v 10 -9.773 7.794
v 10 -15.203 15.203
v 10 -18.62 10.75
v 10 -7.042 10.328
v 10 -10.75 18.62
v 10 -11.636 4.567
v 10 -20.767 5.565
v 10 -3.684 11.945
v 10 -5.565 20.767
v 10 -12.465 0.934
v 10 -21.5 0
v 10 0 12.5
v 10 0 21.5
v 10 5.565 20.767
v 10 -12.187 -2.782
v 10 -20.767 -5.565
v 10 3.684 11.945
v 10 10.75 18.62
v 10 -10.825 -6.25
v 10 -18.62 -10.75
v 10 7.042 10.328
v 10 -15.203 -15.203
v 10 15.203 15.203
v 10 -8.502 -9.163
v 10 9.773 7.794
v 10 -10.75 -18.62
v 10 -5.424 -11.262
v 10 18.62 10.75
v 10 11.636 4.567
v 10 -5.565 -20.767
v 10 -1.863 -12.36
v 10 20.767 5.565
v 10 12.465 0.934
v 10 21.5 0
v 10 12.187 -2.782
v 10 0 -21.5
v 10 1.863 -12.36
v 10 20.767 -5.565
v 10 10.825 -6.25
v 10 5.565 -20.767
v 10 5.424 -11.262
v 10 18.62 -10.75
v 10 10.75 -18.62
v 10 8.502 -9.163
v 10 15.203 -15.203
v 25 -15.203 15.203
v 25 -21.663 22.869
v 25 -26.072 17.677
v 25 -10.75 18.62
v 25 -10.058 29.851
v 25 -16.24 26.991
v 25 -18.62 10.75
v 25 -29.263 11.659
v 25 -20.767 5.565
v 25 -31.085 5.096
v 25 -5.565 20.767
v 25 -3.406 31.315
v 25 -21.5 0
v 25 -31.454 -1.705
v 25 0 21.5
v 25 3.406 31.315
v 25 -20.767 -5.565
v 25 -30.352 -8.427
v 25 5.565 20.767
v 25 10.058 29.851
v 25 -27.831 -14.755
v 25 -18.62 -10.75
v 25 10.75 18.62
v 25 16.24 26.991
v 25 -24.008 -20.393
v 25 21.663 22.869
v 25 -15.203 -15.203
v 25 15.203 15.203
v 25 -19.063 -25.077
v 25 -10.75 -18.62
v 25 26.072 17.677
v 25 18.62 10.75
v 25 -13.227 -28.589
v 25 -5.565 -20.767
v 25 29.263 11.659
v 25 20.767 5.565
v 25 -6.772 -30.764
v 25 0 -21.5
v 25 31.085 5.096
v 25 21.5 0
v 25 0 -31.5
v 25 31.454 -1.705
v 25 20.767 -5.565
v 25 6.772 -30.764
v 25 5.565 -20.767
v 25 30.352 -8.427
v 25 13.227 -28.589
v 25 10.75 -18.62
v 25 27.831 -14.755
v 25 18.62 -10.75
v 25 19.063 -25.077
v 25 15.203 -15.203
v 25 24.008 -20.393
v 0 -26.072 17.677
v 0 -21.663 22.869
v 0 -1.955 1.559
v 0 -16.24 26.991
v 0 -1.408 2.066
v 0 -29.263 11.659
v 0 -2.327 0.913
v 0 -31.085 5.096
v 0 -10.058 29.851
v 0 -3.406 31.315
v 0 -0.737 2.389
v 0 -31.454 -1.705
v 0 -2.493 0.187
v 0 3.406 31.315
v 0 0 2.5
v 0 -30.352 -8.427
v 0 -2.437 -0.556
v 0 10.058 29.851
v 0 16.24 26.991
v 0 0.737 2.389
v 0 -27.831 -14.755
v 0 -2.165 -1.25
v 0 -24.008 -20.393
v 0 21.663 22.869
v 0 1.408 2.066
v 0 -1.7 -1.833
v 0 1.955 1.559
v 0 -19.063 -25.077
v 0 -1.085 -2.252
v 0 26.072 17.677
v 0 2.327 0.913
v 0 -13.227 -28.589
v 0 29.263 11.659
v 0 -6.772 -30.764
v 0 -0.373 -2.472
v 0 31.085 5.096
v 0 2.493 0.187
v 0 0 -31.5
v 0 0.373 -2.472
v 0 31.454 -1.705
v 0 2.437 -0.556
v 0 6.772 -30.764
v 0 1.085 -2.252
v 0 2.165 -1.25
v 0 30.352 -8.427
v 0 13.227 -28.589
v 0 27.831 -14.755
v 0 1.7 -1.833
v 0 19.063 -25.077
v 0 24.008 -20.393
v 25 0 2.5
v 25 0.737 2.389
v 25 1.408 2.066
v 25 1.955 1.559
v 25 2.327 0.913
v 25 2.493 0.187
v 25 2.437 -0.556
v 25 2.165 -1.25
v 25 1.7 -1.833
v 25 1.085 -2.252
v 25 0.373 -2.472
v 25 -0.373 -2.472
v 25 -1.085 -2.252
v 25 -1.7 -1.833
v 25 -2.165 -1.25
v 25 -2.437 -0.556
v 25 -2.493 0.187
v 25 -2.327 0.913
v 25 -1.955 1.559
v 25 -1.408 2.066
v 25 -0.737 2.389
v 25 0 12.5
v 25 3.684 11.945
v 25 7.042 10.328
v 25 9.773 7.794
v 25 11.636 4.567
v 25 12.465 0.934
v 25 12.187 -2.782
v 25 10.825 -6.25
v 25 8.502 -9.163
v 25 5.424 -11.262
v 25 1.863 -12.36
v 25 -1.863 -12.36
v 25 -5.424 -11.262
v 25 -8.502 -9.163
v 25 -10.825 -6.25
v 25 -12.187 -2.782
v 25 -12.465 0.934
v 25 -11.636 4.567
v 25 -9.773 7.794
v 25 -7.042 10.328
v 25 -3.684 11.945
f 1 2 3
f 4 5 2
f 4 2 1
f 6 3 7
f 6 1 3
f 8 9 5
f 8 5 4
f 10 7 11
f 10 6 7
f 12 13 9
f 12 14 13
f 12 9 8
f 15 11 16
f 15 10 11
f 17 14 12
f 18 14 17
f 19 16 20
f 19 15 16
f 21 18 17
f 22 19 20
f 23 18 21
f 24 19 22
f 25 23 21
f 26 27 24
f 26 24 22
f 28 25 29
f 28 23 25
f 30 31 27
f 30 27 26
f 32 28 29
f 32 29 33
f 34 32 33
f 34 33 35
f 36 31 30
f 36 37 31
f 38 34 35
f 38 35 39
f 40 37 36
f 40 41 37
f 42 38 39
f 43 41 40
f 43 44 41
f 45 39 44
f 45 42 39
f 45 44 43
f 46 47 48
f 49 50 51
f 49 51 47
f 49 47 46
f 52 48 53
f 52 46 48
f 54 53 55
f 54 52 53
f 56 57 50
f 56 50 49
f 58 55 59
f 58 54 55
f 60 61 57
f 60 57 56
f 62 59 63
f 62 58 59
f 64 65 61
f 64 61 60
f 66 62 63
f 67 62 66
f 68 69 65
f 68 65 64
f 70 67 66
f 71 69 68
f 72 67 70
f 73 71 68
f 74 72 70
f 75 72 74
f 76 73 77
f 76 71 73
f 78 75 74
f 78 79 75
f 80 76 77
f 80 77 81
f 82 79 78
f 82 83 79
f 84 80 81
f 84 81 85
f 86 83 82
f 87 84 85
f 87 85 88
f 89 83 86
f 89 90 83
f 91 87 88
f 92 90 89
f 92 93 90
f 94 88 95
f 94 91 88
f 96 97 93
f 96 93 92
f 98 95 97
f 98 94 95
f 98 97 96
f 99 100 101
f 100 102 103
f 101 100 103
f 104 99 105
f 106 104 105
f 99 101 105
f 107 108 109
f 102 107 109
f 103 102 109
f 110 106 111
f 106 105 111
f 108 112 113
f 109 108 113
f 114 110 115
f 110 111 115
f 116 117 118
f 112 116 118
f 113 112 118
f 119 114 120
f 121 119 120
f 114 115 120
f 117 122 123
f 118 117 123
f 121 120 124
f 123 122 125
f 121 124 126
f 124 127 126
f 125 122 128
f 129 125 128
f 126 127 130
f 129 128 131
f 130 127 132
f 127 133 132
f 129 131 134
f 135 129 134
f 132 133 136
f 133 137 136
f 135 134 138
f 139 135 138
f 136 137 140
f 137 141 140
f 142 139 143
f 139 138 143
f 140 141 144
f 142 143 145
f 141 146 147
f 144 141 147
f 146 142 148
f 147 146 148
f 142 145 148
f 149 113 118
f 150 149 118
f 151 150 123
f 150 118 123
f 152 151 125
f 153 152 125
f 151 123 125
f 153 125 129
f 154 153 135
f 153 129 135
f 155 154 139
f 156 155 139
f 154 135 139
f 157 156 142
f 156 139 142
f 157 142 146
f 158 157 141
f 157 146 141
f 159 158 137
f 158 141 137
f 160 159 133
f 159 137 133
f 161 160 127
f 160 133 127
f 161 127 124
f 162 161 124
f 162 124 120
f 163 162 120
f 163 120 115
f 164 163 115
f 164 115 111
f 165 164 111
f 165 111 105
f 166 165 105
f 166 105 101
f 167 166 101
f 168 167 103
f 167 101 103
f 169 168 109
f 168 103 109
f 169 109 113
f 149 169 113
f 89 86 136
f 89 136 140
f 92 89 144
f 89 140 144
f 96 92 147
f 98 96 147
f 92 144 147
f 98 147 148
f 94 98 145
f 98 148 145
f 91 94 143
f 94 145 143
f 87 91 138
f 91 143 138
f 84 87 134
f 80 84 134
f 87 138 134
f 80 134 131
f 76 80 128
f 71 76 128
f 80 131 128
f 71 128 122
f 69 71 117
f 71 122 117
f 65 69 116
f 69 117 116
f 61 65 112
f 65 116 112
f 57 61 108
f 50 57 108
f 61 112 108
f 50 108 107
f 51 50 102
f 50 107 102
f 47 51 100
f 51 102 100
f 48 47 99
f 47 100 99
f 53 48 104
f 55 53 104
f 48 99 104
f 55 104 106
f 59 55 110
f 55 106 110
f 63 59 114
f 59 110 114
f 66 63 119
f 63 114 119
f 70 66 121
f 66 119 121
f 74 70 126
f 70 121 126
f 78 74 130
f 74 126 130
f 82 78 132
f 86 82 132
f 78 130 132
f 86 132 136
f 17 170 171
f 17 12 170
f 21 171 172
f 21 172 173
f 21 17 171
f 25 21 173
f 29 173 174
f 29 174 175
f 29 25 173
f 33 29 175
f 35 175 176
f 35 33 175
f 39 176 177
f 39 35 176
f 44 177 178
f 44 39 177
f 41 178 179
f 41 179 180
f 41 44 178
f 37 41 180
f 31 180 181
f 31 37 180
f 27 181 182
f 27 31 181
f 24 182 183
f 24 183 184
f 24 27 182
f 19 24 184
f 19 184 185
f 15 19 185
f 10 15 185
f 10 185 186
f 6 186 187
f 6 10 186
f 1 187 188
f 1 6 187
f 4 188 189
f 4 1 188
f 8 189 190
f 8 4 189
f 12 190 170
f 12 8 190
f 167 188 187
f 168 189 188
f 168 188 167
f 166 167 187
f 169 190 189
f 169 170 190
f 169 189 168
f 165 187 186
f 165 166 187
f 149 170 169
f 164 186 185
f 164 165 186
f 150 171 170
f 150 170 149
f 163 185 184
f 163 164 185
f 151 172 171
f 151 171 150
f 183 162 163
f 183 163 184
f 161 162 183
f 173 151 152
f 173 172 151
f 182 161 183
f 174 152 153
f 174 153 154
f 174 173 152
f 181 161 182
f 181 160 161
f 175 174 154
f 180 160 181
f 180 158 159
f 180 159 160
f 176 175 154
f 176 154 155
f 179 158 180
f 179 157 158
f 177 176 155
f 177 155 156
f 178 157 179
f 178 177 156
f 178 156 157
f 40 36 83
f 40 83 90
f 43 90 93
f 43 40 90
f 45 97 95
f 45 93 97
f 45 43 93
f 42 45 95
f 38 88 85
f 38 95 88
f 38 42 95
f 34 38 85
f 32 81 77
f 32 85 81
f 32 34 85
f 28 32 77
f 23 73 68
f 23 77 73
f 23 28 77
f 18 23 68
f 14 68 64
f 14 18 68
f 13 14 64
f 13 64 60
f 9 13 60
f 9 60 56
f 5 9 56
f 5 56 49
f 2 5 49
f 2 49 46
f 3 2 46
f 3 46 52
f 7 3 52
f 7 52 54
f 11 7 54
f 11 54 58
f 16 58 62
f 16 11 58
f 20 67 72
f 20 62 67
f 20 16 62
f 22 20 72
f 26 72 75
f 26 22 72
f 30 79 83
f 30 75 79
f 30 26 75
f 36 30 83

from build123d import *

# Parameters (mm, degrees)
SKETCH1_R           = 31.5
BOSS_EXTRUDE1_DEPTH = 25
SKETCH3_R           = 2.5
CUT_EXTRUDE1_DEPTH  = 25
SHELL1_T            = -10


with BuildPart() as part:
    # Sketch1 → Boss-Extrude1 (new body)
    with BuildSketch(Plane(origin=(0, 0, 0), x_dir=(0, 0, -1), z_dir=(1, 0, 0))):
        Circle(SKETCH1_R)
    extrude(amount=BOSS_EXTRUDE1_DEPTH)

    # Sketch3 → Cut-Extrude1 (cut)
    with BuildSketch(Plane.ZY):
        Circle(SKETCH3_R)
    extrude(amount=-CUT_EXTRUDE1_DEPTH, mode=Mode.SUBTRACT)

    # Shell1
    shell1_openings = [part.faces().sort_by_distance(p)[0] for p in [
        (25, 0, 2.5),
    ]]
    offset(amount=SHELL1_T, openings=shell1_openings, kind=Kind.INTERSECTION)


solid = part.part
